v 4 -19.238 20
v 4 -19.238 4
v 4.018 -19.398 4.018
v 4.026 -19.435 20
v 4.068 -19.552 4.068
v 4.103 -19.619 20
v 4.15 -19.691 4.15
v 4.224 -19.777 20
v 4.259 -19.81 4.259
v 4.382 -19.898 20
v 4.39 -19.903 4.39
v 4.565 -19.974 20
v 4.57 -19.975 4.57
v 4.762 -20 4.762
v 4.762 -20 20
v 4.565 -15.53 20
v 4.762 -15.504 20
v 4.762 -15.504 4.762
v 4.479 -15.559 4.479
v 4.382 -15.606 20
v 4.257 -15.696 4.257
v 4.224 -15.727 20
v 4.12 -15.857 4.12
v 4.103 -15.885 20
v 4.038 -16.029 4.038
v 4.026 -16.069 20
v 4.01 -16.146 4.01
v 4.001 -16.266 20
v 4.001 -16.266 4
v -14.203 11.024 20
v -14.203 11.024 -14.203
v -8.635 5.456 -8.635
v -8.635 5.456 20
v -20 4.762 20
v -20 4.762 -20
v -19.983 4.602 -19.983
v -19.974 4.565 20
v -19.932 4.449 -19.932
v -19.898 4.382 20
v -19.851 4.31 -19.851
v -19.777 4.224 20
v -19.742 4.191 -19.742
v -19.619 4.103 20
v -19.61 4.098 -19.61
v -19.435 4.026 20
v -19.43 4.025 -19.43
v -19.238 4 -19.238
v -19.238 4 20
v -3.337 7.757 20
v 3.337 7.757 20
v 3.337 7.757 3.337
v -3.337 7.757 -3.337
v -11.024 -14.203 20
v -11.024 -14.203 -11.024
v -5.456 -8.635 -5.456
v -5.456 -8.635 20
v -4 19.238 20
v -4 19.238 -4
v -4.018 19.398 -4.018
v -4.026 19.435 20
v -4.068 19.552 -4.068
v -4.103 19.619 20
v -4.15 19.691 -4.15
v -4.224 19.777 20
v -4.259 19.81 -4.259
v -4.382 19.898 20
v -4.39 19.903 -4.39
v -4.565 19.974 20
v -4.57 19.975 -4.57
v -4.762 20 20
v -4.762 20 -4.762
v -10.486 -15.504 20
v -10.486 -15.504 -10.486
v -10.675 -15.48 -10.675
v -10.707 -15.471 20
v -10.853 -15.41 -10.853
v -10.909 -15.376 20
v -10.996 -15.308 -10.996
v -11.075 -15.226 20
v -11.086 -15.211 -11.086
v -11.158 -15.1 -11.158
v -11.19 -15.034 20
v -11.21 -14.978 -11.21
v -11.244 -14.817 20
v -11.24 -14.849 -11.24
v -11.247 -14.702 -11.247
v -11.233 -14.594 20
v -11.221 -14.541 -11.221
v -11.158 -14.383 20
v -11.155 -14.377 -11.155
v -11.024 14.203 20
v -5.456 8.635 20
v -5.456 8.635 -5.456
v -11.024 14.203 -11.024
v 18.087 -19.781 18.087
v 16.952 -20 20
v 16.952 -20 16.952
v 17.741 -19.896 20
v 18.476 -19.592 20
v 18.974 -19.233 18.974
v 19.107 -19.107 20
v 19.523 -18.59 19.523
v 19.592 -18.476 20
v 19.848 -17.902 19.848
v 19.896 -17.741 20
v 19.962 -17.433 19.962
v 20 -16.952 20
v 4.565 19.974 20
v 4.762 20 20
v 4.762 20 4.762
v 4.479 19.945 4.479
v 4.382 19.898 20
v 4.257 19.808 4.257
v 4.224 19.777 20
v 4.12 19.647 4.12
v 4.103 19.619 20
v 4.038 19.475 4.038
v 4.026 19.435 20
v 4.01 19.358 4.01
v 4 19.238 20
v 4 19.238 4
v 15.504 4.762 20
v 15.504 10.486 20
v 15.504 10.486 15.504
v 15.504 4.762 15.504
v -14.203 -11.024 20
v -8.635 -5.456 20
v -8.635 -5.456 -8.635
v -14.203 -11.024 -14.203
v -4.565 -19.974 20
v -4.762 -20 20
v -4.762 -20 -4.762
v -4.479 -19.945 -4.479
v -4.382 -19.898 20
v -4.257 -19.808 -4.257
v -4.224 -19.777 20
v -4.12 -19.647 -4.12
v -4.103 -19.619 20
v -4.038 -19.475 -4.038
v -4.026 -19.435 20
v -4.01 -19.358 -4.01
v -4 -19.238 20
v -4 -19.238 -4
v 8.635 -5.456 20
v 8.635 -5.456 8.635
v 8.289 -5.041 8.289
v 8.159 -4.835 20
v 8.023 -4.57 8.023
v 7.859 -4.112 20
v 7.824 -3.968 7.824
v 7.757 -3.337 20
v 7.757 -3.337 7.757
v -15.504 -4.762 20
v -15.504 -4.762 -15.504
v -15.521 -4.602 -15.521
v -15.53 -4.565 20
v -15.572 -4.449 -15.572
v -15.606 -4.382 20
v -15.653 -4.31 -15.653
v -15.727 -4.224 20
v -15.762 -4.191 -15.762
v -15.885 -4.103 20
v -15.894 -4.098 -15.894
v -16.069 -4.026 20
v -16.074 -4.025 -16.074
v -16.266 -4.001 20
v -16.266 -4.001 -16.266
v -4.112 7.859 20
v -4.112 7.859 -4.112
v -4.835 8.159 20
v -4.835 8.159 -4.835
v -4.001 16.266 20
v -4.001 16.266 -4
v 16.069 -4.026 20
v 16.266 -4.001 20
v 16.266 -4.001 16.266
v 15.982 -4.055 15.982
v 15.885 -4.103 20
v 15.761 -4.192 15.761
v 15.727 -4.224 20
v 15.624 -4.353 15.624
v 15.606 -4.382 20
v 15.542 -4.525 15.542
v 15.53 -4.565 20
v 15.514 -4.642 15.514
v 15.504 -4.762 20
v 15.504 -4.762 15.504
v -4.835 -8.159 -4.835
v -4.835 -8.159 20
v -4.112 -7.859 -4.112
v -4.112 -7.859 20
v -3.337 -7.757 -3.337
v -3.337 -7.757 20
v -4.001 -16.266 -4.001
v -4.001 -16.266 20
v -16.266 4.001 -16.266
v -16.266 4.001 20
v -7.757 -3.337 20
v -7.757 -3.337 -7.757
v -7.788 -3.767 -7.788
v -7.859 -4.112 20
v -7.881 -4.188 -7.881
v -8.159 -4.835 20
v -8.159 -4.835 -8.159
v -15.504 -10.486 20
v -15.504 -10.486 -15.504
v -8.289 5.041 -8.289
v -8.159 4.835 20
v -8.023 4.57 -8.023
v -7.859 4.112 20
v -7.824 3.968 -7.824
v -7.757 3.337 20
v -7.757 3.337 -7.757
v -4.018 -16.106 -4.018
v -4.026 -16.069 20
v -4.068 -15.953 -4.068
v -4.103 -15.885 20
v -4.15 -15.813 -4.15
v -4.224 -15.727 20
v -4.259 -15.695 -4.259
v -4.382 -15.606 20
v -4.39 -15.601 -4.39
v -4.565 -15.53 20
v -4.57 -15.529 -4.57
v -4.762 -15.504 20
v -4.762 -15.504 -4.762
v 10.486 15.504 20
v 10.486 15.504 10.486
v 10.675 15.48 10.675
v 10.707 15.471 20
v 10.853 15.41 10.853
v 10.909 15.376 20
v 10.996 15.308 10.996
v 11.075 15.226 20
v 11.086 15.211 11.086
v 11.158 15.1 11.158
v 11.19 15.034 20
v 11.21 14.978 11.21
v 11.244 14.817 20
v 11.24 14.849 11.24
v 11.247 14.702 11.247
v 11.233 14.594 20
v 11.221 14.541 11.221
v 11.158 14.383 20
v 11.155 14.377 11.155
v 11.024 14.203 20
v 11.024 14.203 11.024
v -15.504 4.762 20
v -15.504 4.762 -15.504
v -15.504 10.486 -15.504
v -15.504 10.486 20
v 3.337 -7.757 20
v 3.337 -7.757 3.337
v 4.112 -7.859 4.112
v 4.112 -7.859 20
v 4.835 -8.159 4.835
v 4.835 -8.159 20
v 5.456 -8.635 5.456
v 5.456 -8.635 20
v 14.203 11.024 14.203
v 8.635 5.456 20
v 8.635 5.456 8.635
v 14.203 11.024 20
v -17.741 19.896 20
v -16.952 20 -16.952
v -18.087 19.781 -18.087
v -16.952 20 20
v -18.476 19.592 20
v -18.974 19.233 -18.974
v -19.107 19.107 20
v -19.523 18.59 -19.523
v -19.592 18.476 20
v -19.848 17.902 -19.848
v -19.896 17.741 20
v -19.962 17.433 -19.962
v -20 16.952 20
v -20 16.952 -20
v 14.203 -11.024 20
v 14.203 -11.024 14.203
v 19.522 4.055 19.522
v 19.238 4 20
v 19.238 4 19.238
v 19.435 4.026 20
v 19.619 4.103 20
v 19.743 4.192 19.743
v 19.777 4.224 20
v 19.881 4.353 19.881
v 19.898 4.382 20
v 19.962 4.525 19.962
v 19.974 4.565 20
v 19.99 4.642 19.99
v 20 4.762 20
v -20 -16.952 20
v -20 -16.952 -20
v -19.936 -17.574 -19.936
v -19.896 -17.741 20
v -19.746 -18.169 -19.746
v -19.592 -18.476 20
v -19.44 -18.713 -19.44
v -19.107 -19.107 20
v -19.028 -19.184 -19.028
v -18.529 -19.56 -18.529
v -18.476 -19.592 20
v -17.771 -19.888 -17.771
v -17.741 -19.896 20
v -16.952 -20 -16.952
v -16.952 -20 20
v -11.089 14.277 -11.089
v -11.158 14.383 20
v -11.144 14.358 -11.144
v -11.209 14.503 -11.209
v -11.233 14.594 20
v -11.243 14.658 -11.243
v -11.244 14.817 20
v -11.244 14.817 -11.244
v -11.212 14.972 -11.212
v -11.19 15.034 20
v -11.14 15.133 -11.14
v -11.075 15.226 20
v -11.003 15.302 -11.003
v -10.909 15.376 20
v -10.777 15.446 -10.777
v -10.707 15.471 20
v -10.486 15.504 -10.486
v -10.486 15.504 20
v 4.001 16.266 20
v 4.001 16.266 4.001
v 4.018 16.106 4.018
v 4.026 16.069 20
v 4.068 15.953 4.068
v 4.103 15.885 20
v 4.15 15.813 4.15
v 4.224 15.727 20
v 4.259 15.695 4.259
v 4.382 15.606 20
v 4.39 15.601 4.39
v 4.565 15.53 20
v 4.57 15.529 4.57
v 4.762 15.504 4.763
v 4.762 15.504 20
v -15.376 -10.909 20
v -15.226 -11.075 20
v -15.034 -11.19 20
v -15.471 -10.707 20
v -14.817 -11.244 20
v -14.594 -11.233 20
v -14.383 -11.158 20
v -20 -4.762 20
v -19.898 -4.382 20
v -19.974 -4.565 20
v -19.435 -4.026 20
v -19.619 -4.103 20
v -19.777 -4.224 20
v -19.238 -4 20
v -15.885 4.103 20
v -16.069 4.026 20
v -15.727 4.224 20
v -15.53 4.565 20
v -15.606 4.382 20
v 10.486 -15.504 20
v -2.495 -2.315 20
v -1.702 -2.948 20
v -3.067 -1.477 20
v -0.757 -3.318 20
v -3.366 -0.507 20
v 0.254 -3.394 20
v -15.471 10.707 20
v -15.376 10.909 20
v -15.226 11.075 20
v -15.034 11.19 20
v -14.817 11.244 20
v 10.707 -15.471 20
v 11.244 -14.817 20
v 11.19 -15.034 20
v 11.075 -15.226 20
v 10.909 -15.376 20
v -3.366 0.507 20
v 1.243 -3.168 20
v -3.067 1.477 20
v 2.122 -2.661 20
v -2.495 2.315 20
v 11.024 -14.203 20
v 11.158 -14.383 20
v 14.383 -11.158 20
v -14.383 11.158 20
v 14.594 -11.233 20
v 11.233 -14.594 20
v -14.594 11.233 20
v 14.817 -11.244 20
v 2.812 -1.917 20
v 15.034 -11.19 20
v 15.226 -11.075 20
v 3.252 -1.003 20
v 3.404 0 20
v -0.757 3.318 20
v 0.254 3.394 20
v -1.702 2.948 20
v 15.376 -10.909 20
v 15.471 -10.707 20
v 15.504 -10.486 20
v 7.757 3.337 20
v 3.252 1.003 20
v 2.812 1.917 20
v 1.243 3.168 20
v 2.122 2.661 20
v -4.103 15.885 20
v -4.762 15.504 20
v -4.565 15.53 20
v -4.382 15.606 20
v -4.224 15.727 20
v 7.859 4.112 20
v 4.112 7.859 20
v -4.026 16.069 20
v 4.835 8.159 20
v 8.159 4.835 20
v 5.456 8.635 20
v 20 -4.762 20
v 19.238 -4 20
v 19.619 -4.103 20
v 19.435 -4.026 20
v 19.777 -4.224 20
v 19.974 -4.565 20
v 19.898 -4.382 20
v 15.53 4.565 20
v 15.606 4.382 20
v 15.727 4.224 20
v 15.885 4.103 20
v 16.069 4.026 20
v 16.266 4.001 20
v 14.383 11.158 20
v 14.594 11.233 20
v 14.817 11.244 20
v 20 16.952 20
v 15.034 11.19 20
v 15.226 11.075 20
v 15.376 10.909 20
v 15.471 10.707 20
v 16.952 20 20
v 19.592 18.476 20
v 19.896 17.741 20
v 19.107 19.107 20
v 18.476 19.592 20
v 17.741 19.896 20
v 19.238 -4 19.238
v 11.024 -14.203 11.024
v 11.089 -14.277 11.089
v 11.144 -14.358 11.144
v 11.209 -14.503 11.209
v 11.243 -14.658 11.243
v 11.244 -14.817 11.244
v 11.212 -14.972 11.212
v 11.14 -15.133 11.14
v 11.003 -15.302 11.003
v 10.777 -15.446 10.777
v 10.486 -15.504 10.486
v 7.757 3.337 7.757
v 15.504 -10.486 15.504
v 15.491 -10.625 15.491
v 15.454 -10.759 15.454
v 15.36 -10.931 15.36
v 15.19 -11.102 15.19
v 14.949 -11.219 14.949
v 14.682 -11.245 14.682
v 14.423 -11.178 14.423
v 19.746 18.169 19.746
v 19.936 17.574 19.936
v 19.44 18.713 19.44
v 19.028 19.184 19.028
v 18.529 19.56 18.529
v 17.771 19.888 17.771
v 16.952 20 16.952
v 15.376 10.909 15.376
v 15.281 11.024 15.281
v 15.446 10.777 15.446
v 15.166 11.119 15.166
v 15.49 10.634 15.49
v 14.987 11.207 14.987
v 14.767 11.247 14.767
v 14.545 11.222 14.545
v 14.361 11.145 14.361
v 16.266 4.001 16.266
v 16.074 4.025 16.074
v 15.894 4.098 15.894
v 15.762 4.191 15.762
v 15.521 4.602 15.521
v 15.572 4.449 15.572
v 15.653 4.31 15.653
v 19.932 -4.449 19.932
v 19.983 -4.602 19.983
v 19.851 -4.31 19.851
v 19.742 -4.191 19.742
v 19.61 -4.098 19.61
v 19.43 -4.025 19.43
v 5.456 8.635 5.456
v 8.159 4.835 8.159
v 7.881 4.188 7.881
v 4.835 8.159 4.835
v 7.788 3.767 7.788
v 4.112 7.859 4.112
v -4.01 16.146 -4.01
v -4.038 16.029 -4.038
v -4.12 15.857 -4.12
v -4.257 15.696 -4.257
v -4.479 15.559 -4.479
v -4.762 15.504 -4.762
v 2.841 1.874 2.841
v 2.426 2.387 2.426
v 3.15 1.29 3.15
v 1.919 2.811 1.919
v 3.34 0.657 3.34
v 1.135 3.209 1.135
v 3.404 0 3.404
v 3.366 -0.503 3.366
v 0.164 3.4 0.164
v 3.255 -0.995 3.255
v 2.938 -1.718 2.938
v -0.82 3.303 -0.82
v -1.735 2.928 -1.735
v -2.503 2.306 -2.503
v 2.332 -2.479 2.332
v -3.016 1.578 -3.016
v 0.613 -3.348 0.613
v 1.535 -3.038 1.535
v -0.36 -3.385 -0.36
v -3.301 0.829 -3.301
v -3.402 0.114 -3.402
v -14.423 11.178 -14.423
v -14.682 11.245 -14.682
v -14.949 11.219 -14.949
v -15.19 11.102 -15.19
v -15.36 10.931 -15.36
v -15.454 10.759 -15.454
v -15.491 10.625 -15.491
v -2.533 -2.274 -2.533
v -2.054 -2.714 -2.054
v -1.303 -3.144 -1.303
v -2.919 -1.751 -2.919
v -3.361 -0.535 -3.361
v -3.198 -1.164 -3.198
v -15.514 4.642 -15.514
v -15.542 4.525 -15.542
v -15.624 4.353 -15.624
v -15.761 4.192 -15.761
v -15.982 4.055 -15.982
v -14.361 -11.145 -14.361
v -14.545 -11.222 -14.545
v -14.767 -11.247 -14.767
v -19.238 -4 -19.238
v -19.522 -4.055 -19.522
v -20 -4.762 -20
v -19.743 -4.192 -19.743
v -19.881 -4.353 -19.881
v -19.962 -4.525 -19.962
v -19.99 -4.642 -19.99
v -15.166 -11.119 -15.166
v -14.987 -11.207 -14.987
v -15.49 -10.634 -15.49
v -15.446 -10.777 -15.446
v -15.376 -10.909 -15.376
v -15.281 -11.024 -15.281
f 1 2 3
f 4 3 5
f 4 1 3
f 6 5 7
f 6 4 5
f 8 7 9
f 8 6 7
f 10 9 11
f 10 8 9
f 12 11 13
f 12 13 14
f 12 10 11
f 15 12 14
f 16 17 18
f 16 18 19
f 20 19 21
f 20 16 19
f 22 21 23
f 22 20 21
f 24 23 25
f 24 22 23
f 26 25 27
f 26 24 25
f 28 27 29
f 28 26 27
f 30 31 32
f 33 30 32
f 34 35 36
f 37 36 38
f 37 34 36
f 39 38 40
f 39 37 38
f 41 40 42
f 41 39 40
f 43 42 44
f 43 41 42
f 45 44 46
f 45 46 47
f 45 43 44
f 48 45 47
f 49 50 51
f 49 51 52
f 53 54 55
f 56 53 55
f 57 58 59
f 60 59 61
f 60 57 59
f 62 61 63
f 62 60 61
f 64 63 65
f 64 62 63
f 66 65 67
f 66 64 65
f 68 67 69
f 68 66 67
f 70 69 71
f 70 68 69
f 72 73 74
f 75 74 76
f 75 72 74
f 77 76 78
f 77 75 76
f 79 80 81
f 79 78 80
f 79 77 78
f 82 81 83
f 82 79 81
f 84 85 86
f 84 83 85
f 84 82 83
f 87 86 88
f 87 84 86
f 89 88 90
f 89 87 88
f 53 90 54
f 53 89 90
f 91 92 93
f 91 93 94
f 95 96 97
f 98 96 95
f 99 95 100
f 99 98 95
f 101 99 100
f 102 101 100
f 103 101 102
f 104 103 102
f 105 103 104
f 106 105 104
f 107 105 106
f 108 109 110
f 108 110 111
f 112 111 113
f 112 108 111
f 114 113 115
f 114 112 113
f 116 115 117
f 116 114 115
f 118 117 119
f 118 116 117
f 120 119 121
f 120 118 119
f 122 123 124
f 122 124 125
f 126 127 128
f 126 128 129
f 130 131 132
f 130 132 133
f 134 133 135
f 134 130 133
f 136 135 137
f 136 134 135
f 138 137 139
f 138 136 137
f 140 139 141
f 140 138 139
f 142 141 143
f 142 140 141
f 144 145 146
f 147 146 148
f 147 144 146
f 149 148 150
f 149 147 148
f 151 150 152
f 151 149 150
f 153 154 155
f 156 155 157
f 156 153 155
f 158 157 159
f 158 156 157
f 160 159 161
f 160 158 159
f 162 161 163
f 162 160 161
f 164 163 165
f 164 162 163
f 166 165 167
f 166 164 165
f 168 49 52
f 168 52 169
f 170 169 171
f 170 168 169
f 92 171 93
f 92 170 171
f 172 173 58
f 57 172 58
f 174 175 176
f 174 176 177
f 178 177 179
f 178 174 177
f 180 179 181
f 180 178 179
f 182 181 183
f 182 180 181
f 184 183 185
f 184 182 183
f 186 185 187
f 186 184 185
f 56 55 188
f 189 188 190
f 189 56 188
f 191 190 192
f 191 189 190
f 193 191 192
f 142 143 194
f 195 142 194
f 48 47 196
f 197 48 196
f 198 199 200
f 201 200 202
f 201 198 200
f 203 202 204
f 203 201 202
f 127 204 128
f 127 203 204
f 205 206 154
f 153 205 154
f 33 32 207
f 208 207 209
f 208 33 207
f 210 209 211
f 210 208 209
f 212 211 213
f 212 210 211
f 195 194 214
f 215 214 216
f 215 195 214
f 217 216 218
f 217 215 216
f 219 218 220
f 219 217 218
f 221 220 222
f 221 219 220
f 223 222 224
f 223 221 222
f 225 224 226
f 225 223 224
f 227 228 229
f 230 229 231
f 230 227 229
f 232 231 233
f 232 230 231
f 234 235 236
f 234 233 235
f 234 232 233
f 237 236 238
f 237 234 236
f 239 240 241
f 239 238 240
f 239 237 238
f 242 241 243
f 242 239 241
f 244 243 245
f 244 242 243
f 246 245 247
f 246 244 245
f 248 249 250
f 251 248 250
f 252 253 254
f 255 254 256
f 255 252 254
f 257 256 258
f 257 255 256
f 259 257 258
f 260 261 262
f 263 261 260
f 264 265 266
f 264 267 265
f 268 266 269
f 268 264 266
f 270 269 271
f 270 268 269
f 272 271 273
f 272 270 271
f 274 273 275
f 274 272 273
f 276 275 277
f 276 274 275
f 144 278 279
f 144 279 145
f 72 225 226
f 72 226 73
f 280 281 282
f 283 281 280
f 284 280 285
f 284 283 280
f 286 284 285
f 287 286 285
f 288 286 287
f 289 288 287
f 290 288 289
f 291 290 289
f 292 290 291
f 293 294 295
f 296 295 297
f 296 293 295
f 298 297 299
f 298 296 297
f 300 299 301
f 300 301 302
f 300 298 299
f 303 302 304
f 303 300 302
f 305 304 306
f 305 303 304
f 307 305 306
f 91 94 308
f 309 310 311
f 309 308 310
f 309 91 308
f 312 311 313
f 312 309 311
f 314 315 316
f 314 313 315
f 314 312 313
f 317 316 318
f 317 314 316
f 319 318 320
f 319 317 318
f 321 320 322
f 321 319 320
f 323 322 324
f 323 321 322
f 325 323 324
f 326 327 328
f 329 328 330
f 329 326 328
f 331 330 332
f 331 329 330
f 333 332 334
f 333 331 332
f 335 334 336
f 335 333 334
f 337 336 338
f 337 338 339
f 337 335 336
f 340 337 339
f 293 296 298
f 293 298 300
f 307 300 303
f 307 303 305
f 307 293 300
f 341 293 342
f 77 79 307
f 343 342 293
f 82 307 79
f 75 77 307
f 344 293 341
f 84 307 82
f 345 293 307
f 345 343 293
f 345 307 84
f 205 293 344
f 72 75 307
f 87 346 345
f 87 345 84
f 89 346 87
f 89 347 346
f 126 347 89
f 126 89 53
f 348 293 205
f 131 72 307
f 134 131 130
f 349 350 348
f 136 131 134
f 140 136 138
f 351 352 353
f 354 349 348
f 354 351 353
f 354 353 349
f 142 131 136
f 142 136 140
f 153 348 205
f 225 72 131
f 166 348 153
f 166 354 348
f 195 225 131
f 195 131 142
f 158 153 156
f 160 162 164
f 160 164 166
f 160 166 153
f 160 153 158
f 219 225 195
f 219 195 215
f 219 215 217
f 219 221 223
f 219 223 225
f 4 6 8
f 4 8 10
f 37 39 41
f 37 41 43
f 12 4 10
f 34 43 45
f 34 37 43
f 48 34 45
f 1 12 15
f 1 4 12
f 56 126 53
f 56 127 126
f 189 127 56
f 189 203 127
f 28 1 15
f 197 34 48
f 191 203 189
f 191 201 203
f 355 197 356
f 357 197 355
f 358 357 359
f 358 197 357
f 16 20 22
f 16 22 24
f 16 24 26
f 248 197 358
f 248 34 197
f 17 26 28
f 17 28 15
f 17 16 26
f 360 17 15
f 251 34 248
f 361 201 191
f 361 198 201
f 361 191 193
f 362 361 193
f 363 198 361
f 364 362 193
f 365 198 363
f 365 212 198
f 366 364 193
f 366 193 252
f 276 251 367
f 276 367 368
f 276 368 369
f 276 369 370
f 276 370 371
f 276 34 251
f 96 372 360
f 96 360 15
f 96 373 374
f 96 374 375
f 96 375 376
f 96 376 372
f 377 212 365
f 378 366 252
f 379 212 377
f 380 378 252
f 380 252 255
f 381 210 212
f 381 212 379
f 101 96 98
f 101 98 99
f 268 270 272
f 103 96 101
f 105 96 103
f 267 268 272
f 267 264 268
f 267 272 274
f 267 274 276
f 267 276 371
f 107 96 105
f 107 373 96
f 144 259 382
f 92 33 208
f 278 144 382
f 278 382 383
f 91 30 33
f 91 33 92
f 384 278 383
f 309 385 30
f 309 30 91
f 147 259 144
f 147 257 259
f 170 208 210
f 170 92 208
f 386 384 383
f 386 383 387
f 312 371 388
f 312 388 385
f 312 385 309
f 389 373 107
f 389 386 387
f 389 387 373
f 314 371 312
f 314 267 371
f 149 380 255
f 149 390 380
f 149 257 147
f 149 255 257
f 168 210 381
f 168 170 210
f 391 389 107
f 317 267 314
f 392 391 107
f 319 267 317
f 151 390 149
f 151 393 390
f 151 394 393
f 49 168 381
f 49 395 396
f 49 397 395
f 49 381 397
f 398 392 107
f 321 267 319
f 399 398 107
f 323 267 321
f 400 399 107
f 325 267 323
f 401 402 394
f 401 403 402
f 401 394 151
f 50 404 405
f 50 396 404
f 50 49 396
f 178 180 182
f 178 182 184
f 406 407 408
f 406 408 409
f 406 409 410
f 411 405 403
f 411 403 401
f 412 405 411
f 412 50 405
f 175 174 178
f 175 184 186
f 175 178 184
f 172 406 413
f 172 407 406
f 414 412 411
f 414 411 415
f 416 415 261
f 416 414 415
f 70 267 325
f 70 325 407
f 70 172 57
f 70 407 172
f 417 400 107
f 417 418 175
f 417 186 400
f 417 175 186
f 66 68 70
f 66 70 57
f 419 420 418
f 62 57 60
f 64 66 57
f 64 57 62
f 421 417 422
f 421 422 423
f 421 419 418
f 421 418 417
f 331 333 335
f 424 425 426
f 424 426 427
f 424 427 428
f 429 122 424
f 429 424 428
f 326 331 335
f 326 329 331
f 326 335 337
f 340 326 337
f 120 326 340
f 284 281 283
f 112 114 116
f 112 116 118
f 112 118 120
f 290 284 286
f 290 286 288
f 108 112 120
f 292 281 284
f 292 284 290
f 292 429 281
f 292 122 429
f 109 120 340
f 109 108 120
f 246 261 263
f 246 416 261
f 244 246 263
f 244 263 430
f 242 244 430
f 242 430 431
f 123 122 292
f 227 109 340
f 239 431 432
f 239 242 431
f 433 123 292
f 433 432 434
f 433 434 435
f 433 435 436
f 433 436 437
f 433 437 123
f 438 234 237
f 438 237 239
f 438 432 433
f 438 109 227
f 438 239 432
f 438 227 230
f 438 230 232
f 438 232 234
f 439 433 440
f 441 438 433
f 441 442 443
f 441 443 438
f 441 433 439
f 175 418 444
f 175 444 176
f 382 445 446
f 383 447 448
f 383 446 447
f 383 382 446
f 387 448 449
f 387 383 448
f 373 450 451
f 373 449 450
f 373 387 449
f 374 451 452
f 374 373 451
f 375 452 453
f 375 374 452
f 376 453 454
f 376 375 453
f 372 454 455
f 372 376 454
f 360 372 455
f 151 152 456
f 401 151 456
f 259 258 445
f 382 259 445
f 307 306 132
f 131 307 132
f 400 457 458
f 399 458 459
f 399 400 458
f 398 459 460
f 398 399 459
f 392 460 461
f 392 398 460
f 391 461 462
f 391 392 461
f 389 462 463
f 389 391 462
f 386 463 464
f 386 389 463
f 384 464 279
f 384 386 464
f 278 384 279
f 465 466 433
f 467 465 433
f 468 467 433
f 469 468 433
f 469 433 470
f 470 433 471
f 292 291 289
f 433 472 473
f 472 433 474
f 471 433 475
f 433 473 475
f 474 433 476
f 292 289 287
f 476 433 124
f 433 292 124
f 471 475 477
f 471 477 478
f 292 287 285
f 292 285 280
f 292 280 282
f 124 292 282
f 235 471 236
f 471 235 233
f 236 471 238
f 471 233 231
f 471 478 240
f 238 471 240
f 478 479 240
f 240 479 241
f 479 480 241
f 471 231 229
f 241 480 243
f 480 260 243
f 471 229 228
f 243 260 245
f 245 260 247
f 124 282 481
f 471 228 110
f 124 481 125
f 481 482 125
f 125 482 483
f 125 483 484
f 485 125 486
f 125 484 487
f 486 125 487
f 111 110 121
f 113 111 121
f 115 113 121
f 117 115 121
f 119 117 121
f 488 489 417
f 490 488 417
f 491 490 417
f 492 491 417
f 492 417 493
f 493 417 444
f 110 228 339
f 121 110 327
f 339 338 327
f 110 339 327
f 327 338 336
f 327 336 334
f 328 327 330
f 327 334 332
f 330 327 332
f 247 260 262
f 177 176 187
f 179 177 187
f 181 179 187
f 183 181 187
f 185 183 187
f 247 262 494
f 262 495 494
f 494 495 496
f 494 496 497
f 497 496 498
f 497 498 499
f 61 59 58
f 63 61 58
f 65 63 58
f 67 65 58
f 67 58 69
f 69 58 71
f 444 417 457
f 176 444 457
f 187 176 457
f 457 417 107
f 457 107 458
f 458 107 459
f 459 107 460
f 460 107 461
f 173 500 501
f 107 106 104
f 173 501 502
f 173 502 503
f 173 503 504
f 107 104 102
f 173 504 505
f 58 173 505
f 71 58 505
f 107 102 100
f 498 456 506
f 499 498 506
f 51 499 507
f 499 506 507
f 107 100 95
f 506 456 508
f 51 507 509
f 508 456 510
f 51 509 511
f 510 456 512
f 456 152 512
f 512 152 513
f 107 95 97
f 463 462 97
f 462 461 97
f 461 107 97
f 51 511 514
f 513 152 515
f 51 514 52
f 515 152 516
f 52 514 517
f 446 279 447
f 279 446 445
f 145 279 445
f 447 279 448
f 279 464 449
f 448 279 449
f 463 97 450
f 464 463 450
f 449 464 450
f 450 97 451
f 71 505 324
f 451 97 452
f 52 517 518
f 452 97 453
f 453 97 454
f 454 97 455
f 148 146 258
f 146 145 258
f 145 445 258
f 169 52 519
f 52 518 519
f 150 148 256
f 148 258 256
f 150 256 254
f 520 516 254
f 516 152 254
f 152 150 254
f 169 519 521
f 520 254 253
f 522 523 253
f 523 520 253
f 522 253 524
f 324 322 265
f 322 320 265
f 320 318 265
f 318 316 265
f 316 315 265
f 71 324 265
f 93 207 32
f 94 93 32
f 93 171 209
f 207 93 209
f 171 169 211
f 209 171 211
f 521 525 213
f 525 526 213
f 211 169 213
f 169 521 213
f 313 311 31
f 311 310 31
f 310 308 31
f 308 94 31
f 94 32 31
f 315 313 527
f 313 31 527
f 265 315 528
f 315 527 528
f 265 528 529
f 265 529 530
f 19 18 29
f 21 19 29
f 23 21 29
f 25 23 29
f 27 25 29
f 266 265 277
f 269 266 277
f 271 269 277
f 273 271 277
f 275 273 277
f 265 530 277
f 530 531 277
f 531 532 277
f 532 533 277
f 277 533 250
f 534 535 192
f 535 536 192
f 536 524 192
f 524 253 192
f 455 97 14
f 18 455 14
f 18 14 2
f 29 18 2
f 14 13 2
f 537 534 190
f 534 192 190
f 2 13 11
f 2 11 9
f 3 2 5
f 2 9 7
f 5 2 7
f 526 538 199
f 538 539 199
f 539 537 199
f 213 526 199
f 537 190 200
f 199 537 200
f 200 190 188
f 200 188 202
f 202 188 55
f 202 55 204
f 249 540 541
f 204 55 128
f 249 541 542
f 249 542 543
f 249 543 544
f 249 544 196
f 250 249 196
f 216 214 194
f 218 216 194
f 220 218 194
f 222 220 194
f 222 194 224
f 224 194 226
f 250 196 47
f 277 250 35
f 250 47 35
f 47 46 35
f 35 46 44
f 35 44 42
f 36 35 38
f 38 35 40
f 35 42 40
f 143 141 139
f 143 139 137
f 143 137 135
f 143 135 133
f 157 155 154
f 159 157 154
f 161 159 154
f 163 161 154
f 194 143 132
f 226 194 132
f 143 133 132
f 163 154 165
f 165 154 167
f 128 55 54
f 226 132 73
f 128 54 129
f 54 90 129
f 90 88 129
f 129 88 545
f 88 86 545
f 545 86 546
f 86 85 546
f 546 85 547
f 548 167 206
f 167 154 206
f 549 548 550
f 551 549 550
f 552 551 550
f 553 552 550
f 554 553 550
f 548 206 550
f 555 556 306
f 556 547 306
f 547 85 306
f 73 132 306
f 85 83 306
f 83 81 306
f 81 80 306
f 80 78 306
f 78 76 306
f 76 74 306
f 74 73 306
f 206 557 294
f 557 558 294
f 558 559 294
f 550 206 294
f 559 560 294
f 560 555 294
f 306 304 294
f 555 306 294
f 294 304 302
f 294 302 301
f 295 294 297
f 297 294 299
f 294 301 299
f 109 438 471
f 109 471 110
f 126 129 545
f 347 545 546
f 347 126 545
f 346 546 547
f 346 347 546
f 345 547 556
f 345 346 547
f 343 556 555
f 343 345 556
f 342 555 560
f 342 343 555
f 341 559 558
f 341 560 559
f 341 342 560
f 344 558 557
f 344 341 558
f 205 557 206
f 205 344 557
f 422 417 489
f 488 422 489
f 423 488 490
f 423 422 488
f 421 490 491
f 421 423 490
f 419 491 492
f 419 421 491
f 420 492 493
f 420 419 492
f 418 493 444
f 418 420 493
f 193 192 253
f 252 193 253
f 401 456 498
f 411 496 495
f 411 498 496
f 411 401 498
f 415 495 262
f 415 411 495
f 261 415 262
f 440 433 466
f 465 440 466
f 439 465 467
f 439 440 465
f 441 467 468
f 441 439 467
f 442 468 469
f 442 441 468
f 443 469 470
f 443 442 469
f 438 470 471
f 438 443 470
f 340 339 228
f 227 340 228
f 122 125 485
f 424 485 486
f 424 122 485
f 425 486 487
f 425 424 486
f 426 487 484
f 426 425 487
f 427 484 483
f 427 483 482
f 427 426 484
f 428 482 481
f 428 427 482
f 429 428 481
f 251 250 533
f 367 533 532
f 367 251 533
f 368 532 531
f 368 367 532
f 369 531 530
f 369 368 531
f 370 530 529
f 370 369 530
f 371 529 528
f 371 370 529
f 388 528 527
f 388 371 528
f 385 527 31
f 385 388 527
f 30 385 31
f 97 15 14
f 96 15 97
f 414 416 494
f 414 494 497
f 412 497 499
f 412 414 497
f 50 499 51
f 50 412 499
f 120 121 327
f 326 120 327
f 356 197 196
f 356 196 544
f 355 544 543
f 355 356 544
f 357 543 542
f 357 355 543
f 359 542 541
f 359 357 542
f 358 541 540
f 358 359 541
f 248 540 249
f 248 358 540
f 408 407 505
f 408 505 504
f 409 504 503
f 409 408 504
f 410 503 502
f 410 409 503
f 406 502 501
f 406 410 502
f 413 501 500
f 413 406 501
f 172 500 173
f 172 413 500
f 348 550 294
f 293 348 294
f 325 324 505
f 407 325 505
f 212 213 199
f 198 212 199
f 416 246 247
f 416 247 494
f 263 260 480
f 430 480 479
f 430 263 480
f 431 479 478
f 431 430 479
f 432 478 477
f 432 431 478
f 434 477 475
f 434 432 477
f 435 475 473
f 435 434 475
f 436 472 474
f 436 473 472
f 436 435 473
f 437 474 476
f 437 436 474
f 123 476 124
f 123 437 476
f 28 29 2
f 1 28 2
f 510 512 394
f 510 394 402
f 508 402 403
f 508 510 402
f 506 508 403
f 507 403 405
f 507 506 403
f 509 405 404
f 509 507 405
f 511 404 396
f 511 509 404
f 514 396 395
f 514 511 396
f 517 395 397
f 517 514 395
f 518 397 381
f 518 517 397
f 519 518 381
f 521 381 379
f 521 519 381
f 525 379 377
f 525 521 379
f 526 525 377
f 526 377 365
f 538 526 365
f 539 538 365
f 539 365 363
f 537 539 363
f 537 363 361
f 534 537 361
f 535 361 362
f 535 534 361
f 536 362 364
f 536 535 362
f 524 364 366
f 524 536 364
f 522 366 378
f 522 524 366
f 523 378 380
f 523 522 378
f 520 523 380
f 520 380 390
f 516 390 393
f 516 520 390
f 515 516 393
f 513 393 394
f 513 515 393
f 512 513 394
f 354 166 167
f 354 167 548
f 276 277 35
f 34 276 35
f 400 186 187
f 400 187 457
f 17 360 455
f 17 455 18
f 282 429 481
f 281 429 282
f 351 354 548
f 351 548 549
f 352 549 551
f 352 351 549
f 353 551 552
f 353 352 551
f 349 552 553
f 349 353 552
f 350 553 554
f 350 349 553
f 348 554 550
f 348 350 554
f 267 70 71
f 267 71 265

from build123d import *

# Parameters (mm, degrees)
SKETCH1_R          = 3.4036
EXTRUDE1_DEPTH     = 20
CUT_EXTRUDE1_DEPTH = 49.989794856


with BuildPart() as part:
    # Sketch1 → Extrude1 (new, symmetric)
    with BuildSketch(Plane.XY):
        with BuildLine():
            Line((-20, 16.952), (-20, 4.7625))
            ThreePointArc((-20, 4.7625), (-19.776815367, 4.223684633), (-19.238, 4.0005))
            Line((-19.238, 4.0005), (-16.2662, 4.0005))
            ThreePointArc((-16.2662, 4.0005), (-15.727384633, 4.223684633), (-15.5042, 4.7625))
            Line((-15.5042, 4.7625), (-15.5042, 10.485558599))
            ThreePointArc((-15.5042, 10.485558599), (-15.033804775, 11.189554802), (-14.203384633, 11.024373966))
            Line((-14.203384633, 11.024373966), (-8.635059555, 5.456048889))
            ThreePointArc((-8.635059555, 5.456048889), (-7.985348265, 4.483687227), (-7.7572, 3.336708444))
            Line((-7.7572, 3.336708444), (-7.7572, -3.336708444))
            ThreePointArc((-7.7572, -3.336708444), (-7.985348265, -4.483687227), (-8.635059555, -5.456048889))
            Line((-8.635059555, -5.456048889), (-14.203384633, -11.024373966))
            ThreePointArc((-14.203384633, -11.024373966), (-15.033804775, -11.189554802), (-15.5042, -10.485558599))
            Line((-15.5042, -10.485558599), (-15.5042, -4.7625))
            ThreePointArc((-15.5042, -4.7625), (-15.727384633, -4.223684633), (-16.2662, -4.0005))
            Line((-16.2662, -4.0005), (-19.238, -4.0005))
            ThreePointArc((-19.238, -4.0005), (-19.776815367, -4.223684633), (-20, -4.7625))
            Line((-20, -4.7625), (-20, -16.952))
            ThreePointArc((-20, -16.952), (-19.107261469, -19.107261469), (-16.952, -20))
            Line((-16.952, -20), (-4.7625, -20))
            ThreePointArc((-4.7625, -20), (-4.223684633, -19.776815367), (-4.0005, -19.238))
            Line((-4.0005, -19.238), (-4.0005, -16.2662))
            ThreePointArc((-4.0005, -16.2662), (-4.223684633, -15.727384633), (-4.7625, -15.5042))
            Line((-4.7625, -15.5042), (-10.485558599, -15.5042))
            ThreePointArc((-10.485558599, -15.5042), (-11.189554802, -15.033804775), (-11.024373966, -14.203384633))
            Line((-11.024373966, -14.203384633), (-5.456048889, -8.635059555))
            ThreePointArc((-5.456048889, -8.635059555), (-4.483687227, -7.985348265), (-3.336708444, -7.7572))
            Line((-3.336708444, -7.7572), (3.336708444, -7.7572))
            ThreePointArc((3.336708444, -7.7572), (4.483687227, -7.985348265), (5.456048889, -8.635059555))
            Line((5.456048889, -8.635059555), (11.024373966, -14.203384633))
            ThreePointArc((11.024373966, -14.203384633), (11.189554802, -15.033804775), (10.485558599, -15.5042))
            Line((10.485558599, -15.5042), (4.7625, -15.5042))
            ThreePointArc((4.7625, -15.5042), (4.223684633, -15.727384633), (4.0005, -16.2662))
            Line((4.0005, -16.2662), (4.0005, -19.238))
            ThreePointArc((4.0005, -19.238), (4.223684633, -19.776815367), (4.7625, -20))
            Line((4.7625, -20), (16.952, -20))
            ThreePointArc((16.952, -20), (19.107261469, -19.107261469), (20, -16.952))
            Line((20, -16.952), (20, -4.7625))
            ThreePointArc((20, -4.7625), (19.776815367, -4.223684633), (19.238, -4.0005))
            Line((19.238, -4.0005), (16.2662, -4.0005))
            ThreePointArc((16.2662, -4.0005), (15.727384633, -4.223684633), (15.5042, -4.7625))
            Line((15.5042, -4.7625), (15.5042, -10.485558599))
            ThreePointArc((15.5042, -10.485558599), (15.033804775, -11.189554802), (14.203384633, -11.024373966))
            Line((14.203384633, -11.024373966), (8.635059555, -5.456048889))
            ThreePointArc((8.635059555, -5.456048889), (7.985348265, -4.483687227), (7.7572, -3.336708444))
            Line((7.7572, -3.336708444), (7.7572, 3.336708444))
            ThreePointArc((7.7572, 3.336708444), (7.985348265, 4.483687227), (8.635059555, 5.456048889))
            Line((8.635059555, 5.456048889), (14.203384633, 11.024373966))
            ThreePointArc((14.203384633, 11.024373966), (15.033804775, 11.189554802), (15.5042, 10.485558599))
            Line((15.5042, 10.485558599), (15.5042, 4.7625))
            ThreePointArc((15.5042, 4.7625), (15.727384633, 4.223684633), (16.2662, 4.0005))
            Line((16.2662, 4.0005), (19.238, 4.0005))
            ThreePointArc((19.238, 4.0005), (19.776815367, 4.223684633), (20, 4.7625))
            Line((20, 4.7625), (20, 16.952))
            ThreePointArc((20, 16.952), (19.107261469, 19.107261469), (16.952, 20))
            Line((16.952, 20), (4.7625, 20))
            ThreePointArc((4.7625, 20), (4.223684633, 19.776815367), (4.0005, 19.238))
            Line((4.0005, 19.238), (4.0005, 16.2662))
            ThreePointArc((4.0005, 16.2662), (4.223684633, 15.727384633), (4.7625, 15.5042))
            Line((4.7625, 15.5042), (10.485558599, 15.5042))
            ThreePointArc((10.485558599, 15.5042), (11.189554802, 15.033804775), (11.024373966, 14.203384633))
            Line((11.024373966, 14.203384633), (5.456048889, 8.635059555))
            ThreePointArc((5.456048889, 8.635059555), (4.483687227, 7.985348265), (3.336708444, 7.7572))
            Line((3.336708444, 7.7572), (-3.336708444, 7.7572))
            ThreePointArc((-3.336708444, 7.7572), (-4.483687227, 7.985348265), (-5.456048889, 8.635059555))
            Line((-5.456048889, 8.635059555), (-11.024373966, 14.203384633))
            ThreePointArc((-11.024373966, 14.203384633), (-11.189554802, 15.033804775), (-10.485558599, 15.5042))
            Line((-10.485558599, 15.5042), (-4.7625, 15.5042))
            ThreePointArc((-4.7625, 15.5042), (-4.223684633, 15.727384633), (-4.0005, 16.2662))
            Line((-4.0005, 16.2662), (-4.0005, 19.238))
            ThreePointArc((-4.0005, 19.238), (-4.223684633, 19.776815367), (-4.7625, 20))
            Line((-4.7625, 20), (-16.952, 20))
            ThreePointArc((-16.952, 20), (-19.107261469, 19.107261469), (-20, 16.952))
        make_face()
        Circle(SKETCH1_R, mode=Mode.SUBTRACT)
    extrude(amount=EXTRUDE1_DEPTH, both=True)

    # Sketch3 → Cut-Extrude1 (cut, through all)
    with BuildSketch(Plane.XZ.offset(20)):
        Polygon((20, 20), (-20, -20), (20, -20), align=None)
    extrude(amount=-CUT_EXTRUDE1_DEPTH, mode=Mode.SUBTRACT)


solid = part.part
